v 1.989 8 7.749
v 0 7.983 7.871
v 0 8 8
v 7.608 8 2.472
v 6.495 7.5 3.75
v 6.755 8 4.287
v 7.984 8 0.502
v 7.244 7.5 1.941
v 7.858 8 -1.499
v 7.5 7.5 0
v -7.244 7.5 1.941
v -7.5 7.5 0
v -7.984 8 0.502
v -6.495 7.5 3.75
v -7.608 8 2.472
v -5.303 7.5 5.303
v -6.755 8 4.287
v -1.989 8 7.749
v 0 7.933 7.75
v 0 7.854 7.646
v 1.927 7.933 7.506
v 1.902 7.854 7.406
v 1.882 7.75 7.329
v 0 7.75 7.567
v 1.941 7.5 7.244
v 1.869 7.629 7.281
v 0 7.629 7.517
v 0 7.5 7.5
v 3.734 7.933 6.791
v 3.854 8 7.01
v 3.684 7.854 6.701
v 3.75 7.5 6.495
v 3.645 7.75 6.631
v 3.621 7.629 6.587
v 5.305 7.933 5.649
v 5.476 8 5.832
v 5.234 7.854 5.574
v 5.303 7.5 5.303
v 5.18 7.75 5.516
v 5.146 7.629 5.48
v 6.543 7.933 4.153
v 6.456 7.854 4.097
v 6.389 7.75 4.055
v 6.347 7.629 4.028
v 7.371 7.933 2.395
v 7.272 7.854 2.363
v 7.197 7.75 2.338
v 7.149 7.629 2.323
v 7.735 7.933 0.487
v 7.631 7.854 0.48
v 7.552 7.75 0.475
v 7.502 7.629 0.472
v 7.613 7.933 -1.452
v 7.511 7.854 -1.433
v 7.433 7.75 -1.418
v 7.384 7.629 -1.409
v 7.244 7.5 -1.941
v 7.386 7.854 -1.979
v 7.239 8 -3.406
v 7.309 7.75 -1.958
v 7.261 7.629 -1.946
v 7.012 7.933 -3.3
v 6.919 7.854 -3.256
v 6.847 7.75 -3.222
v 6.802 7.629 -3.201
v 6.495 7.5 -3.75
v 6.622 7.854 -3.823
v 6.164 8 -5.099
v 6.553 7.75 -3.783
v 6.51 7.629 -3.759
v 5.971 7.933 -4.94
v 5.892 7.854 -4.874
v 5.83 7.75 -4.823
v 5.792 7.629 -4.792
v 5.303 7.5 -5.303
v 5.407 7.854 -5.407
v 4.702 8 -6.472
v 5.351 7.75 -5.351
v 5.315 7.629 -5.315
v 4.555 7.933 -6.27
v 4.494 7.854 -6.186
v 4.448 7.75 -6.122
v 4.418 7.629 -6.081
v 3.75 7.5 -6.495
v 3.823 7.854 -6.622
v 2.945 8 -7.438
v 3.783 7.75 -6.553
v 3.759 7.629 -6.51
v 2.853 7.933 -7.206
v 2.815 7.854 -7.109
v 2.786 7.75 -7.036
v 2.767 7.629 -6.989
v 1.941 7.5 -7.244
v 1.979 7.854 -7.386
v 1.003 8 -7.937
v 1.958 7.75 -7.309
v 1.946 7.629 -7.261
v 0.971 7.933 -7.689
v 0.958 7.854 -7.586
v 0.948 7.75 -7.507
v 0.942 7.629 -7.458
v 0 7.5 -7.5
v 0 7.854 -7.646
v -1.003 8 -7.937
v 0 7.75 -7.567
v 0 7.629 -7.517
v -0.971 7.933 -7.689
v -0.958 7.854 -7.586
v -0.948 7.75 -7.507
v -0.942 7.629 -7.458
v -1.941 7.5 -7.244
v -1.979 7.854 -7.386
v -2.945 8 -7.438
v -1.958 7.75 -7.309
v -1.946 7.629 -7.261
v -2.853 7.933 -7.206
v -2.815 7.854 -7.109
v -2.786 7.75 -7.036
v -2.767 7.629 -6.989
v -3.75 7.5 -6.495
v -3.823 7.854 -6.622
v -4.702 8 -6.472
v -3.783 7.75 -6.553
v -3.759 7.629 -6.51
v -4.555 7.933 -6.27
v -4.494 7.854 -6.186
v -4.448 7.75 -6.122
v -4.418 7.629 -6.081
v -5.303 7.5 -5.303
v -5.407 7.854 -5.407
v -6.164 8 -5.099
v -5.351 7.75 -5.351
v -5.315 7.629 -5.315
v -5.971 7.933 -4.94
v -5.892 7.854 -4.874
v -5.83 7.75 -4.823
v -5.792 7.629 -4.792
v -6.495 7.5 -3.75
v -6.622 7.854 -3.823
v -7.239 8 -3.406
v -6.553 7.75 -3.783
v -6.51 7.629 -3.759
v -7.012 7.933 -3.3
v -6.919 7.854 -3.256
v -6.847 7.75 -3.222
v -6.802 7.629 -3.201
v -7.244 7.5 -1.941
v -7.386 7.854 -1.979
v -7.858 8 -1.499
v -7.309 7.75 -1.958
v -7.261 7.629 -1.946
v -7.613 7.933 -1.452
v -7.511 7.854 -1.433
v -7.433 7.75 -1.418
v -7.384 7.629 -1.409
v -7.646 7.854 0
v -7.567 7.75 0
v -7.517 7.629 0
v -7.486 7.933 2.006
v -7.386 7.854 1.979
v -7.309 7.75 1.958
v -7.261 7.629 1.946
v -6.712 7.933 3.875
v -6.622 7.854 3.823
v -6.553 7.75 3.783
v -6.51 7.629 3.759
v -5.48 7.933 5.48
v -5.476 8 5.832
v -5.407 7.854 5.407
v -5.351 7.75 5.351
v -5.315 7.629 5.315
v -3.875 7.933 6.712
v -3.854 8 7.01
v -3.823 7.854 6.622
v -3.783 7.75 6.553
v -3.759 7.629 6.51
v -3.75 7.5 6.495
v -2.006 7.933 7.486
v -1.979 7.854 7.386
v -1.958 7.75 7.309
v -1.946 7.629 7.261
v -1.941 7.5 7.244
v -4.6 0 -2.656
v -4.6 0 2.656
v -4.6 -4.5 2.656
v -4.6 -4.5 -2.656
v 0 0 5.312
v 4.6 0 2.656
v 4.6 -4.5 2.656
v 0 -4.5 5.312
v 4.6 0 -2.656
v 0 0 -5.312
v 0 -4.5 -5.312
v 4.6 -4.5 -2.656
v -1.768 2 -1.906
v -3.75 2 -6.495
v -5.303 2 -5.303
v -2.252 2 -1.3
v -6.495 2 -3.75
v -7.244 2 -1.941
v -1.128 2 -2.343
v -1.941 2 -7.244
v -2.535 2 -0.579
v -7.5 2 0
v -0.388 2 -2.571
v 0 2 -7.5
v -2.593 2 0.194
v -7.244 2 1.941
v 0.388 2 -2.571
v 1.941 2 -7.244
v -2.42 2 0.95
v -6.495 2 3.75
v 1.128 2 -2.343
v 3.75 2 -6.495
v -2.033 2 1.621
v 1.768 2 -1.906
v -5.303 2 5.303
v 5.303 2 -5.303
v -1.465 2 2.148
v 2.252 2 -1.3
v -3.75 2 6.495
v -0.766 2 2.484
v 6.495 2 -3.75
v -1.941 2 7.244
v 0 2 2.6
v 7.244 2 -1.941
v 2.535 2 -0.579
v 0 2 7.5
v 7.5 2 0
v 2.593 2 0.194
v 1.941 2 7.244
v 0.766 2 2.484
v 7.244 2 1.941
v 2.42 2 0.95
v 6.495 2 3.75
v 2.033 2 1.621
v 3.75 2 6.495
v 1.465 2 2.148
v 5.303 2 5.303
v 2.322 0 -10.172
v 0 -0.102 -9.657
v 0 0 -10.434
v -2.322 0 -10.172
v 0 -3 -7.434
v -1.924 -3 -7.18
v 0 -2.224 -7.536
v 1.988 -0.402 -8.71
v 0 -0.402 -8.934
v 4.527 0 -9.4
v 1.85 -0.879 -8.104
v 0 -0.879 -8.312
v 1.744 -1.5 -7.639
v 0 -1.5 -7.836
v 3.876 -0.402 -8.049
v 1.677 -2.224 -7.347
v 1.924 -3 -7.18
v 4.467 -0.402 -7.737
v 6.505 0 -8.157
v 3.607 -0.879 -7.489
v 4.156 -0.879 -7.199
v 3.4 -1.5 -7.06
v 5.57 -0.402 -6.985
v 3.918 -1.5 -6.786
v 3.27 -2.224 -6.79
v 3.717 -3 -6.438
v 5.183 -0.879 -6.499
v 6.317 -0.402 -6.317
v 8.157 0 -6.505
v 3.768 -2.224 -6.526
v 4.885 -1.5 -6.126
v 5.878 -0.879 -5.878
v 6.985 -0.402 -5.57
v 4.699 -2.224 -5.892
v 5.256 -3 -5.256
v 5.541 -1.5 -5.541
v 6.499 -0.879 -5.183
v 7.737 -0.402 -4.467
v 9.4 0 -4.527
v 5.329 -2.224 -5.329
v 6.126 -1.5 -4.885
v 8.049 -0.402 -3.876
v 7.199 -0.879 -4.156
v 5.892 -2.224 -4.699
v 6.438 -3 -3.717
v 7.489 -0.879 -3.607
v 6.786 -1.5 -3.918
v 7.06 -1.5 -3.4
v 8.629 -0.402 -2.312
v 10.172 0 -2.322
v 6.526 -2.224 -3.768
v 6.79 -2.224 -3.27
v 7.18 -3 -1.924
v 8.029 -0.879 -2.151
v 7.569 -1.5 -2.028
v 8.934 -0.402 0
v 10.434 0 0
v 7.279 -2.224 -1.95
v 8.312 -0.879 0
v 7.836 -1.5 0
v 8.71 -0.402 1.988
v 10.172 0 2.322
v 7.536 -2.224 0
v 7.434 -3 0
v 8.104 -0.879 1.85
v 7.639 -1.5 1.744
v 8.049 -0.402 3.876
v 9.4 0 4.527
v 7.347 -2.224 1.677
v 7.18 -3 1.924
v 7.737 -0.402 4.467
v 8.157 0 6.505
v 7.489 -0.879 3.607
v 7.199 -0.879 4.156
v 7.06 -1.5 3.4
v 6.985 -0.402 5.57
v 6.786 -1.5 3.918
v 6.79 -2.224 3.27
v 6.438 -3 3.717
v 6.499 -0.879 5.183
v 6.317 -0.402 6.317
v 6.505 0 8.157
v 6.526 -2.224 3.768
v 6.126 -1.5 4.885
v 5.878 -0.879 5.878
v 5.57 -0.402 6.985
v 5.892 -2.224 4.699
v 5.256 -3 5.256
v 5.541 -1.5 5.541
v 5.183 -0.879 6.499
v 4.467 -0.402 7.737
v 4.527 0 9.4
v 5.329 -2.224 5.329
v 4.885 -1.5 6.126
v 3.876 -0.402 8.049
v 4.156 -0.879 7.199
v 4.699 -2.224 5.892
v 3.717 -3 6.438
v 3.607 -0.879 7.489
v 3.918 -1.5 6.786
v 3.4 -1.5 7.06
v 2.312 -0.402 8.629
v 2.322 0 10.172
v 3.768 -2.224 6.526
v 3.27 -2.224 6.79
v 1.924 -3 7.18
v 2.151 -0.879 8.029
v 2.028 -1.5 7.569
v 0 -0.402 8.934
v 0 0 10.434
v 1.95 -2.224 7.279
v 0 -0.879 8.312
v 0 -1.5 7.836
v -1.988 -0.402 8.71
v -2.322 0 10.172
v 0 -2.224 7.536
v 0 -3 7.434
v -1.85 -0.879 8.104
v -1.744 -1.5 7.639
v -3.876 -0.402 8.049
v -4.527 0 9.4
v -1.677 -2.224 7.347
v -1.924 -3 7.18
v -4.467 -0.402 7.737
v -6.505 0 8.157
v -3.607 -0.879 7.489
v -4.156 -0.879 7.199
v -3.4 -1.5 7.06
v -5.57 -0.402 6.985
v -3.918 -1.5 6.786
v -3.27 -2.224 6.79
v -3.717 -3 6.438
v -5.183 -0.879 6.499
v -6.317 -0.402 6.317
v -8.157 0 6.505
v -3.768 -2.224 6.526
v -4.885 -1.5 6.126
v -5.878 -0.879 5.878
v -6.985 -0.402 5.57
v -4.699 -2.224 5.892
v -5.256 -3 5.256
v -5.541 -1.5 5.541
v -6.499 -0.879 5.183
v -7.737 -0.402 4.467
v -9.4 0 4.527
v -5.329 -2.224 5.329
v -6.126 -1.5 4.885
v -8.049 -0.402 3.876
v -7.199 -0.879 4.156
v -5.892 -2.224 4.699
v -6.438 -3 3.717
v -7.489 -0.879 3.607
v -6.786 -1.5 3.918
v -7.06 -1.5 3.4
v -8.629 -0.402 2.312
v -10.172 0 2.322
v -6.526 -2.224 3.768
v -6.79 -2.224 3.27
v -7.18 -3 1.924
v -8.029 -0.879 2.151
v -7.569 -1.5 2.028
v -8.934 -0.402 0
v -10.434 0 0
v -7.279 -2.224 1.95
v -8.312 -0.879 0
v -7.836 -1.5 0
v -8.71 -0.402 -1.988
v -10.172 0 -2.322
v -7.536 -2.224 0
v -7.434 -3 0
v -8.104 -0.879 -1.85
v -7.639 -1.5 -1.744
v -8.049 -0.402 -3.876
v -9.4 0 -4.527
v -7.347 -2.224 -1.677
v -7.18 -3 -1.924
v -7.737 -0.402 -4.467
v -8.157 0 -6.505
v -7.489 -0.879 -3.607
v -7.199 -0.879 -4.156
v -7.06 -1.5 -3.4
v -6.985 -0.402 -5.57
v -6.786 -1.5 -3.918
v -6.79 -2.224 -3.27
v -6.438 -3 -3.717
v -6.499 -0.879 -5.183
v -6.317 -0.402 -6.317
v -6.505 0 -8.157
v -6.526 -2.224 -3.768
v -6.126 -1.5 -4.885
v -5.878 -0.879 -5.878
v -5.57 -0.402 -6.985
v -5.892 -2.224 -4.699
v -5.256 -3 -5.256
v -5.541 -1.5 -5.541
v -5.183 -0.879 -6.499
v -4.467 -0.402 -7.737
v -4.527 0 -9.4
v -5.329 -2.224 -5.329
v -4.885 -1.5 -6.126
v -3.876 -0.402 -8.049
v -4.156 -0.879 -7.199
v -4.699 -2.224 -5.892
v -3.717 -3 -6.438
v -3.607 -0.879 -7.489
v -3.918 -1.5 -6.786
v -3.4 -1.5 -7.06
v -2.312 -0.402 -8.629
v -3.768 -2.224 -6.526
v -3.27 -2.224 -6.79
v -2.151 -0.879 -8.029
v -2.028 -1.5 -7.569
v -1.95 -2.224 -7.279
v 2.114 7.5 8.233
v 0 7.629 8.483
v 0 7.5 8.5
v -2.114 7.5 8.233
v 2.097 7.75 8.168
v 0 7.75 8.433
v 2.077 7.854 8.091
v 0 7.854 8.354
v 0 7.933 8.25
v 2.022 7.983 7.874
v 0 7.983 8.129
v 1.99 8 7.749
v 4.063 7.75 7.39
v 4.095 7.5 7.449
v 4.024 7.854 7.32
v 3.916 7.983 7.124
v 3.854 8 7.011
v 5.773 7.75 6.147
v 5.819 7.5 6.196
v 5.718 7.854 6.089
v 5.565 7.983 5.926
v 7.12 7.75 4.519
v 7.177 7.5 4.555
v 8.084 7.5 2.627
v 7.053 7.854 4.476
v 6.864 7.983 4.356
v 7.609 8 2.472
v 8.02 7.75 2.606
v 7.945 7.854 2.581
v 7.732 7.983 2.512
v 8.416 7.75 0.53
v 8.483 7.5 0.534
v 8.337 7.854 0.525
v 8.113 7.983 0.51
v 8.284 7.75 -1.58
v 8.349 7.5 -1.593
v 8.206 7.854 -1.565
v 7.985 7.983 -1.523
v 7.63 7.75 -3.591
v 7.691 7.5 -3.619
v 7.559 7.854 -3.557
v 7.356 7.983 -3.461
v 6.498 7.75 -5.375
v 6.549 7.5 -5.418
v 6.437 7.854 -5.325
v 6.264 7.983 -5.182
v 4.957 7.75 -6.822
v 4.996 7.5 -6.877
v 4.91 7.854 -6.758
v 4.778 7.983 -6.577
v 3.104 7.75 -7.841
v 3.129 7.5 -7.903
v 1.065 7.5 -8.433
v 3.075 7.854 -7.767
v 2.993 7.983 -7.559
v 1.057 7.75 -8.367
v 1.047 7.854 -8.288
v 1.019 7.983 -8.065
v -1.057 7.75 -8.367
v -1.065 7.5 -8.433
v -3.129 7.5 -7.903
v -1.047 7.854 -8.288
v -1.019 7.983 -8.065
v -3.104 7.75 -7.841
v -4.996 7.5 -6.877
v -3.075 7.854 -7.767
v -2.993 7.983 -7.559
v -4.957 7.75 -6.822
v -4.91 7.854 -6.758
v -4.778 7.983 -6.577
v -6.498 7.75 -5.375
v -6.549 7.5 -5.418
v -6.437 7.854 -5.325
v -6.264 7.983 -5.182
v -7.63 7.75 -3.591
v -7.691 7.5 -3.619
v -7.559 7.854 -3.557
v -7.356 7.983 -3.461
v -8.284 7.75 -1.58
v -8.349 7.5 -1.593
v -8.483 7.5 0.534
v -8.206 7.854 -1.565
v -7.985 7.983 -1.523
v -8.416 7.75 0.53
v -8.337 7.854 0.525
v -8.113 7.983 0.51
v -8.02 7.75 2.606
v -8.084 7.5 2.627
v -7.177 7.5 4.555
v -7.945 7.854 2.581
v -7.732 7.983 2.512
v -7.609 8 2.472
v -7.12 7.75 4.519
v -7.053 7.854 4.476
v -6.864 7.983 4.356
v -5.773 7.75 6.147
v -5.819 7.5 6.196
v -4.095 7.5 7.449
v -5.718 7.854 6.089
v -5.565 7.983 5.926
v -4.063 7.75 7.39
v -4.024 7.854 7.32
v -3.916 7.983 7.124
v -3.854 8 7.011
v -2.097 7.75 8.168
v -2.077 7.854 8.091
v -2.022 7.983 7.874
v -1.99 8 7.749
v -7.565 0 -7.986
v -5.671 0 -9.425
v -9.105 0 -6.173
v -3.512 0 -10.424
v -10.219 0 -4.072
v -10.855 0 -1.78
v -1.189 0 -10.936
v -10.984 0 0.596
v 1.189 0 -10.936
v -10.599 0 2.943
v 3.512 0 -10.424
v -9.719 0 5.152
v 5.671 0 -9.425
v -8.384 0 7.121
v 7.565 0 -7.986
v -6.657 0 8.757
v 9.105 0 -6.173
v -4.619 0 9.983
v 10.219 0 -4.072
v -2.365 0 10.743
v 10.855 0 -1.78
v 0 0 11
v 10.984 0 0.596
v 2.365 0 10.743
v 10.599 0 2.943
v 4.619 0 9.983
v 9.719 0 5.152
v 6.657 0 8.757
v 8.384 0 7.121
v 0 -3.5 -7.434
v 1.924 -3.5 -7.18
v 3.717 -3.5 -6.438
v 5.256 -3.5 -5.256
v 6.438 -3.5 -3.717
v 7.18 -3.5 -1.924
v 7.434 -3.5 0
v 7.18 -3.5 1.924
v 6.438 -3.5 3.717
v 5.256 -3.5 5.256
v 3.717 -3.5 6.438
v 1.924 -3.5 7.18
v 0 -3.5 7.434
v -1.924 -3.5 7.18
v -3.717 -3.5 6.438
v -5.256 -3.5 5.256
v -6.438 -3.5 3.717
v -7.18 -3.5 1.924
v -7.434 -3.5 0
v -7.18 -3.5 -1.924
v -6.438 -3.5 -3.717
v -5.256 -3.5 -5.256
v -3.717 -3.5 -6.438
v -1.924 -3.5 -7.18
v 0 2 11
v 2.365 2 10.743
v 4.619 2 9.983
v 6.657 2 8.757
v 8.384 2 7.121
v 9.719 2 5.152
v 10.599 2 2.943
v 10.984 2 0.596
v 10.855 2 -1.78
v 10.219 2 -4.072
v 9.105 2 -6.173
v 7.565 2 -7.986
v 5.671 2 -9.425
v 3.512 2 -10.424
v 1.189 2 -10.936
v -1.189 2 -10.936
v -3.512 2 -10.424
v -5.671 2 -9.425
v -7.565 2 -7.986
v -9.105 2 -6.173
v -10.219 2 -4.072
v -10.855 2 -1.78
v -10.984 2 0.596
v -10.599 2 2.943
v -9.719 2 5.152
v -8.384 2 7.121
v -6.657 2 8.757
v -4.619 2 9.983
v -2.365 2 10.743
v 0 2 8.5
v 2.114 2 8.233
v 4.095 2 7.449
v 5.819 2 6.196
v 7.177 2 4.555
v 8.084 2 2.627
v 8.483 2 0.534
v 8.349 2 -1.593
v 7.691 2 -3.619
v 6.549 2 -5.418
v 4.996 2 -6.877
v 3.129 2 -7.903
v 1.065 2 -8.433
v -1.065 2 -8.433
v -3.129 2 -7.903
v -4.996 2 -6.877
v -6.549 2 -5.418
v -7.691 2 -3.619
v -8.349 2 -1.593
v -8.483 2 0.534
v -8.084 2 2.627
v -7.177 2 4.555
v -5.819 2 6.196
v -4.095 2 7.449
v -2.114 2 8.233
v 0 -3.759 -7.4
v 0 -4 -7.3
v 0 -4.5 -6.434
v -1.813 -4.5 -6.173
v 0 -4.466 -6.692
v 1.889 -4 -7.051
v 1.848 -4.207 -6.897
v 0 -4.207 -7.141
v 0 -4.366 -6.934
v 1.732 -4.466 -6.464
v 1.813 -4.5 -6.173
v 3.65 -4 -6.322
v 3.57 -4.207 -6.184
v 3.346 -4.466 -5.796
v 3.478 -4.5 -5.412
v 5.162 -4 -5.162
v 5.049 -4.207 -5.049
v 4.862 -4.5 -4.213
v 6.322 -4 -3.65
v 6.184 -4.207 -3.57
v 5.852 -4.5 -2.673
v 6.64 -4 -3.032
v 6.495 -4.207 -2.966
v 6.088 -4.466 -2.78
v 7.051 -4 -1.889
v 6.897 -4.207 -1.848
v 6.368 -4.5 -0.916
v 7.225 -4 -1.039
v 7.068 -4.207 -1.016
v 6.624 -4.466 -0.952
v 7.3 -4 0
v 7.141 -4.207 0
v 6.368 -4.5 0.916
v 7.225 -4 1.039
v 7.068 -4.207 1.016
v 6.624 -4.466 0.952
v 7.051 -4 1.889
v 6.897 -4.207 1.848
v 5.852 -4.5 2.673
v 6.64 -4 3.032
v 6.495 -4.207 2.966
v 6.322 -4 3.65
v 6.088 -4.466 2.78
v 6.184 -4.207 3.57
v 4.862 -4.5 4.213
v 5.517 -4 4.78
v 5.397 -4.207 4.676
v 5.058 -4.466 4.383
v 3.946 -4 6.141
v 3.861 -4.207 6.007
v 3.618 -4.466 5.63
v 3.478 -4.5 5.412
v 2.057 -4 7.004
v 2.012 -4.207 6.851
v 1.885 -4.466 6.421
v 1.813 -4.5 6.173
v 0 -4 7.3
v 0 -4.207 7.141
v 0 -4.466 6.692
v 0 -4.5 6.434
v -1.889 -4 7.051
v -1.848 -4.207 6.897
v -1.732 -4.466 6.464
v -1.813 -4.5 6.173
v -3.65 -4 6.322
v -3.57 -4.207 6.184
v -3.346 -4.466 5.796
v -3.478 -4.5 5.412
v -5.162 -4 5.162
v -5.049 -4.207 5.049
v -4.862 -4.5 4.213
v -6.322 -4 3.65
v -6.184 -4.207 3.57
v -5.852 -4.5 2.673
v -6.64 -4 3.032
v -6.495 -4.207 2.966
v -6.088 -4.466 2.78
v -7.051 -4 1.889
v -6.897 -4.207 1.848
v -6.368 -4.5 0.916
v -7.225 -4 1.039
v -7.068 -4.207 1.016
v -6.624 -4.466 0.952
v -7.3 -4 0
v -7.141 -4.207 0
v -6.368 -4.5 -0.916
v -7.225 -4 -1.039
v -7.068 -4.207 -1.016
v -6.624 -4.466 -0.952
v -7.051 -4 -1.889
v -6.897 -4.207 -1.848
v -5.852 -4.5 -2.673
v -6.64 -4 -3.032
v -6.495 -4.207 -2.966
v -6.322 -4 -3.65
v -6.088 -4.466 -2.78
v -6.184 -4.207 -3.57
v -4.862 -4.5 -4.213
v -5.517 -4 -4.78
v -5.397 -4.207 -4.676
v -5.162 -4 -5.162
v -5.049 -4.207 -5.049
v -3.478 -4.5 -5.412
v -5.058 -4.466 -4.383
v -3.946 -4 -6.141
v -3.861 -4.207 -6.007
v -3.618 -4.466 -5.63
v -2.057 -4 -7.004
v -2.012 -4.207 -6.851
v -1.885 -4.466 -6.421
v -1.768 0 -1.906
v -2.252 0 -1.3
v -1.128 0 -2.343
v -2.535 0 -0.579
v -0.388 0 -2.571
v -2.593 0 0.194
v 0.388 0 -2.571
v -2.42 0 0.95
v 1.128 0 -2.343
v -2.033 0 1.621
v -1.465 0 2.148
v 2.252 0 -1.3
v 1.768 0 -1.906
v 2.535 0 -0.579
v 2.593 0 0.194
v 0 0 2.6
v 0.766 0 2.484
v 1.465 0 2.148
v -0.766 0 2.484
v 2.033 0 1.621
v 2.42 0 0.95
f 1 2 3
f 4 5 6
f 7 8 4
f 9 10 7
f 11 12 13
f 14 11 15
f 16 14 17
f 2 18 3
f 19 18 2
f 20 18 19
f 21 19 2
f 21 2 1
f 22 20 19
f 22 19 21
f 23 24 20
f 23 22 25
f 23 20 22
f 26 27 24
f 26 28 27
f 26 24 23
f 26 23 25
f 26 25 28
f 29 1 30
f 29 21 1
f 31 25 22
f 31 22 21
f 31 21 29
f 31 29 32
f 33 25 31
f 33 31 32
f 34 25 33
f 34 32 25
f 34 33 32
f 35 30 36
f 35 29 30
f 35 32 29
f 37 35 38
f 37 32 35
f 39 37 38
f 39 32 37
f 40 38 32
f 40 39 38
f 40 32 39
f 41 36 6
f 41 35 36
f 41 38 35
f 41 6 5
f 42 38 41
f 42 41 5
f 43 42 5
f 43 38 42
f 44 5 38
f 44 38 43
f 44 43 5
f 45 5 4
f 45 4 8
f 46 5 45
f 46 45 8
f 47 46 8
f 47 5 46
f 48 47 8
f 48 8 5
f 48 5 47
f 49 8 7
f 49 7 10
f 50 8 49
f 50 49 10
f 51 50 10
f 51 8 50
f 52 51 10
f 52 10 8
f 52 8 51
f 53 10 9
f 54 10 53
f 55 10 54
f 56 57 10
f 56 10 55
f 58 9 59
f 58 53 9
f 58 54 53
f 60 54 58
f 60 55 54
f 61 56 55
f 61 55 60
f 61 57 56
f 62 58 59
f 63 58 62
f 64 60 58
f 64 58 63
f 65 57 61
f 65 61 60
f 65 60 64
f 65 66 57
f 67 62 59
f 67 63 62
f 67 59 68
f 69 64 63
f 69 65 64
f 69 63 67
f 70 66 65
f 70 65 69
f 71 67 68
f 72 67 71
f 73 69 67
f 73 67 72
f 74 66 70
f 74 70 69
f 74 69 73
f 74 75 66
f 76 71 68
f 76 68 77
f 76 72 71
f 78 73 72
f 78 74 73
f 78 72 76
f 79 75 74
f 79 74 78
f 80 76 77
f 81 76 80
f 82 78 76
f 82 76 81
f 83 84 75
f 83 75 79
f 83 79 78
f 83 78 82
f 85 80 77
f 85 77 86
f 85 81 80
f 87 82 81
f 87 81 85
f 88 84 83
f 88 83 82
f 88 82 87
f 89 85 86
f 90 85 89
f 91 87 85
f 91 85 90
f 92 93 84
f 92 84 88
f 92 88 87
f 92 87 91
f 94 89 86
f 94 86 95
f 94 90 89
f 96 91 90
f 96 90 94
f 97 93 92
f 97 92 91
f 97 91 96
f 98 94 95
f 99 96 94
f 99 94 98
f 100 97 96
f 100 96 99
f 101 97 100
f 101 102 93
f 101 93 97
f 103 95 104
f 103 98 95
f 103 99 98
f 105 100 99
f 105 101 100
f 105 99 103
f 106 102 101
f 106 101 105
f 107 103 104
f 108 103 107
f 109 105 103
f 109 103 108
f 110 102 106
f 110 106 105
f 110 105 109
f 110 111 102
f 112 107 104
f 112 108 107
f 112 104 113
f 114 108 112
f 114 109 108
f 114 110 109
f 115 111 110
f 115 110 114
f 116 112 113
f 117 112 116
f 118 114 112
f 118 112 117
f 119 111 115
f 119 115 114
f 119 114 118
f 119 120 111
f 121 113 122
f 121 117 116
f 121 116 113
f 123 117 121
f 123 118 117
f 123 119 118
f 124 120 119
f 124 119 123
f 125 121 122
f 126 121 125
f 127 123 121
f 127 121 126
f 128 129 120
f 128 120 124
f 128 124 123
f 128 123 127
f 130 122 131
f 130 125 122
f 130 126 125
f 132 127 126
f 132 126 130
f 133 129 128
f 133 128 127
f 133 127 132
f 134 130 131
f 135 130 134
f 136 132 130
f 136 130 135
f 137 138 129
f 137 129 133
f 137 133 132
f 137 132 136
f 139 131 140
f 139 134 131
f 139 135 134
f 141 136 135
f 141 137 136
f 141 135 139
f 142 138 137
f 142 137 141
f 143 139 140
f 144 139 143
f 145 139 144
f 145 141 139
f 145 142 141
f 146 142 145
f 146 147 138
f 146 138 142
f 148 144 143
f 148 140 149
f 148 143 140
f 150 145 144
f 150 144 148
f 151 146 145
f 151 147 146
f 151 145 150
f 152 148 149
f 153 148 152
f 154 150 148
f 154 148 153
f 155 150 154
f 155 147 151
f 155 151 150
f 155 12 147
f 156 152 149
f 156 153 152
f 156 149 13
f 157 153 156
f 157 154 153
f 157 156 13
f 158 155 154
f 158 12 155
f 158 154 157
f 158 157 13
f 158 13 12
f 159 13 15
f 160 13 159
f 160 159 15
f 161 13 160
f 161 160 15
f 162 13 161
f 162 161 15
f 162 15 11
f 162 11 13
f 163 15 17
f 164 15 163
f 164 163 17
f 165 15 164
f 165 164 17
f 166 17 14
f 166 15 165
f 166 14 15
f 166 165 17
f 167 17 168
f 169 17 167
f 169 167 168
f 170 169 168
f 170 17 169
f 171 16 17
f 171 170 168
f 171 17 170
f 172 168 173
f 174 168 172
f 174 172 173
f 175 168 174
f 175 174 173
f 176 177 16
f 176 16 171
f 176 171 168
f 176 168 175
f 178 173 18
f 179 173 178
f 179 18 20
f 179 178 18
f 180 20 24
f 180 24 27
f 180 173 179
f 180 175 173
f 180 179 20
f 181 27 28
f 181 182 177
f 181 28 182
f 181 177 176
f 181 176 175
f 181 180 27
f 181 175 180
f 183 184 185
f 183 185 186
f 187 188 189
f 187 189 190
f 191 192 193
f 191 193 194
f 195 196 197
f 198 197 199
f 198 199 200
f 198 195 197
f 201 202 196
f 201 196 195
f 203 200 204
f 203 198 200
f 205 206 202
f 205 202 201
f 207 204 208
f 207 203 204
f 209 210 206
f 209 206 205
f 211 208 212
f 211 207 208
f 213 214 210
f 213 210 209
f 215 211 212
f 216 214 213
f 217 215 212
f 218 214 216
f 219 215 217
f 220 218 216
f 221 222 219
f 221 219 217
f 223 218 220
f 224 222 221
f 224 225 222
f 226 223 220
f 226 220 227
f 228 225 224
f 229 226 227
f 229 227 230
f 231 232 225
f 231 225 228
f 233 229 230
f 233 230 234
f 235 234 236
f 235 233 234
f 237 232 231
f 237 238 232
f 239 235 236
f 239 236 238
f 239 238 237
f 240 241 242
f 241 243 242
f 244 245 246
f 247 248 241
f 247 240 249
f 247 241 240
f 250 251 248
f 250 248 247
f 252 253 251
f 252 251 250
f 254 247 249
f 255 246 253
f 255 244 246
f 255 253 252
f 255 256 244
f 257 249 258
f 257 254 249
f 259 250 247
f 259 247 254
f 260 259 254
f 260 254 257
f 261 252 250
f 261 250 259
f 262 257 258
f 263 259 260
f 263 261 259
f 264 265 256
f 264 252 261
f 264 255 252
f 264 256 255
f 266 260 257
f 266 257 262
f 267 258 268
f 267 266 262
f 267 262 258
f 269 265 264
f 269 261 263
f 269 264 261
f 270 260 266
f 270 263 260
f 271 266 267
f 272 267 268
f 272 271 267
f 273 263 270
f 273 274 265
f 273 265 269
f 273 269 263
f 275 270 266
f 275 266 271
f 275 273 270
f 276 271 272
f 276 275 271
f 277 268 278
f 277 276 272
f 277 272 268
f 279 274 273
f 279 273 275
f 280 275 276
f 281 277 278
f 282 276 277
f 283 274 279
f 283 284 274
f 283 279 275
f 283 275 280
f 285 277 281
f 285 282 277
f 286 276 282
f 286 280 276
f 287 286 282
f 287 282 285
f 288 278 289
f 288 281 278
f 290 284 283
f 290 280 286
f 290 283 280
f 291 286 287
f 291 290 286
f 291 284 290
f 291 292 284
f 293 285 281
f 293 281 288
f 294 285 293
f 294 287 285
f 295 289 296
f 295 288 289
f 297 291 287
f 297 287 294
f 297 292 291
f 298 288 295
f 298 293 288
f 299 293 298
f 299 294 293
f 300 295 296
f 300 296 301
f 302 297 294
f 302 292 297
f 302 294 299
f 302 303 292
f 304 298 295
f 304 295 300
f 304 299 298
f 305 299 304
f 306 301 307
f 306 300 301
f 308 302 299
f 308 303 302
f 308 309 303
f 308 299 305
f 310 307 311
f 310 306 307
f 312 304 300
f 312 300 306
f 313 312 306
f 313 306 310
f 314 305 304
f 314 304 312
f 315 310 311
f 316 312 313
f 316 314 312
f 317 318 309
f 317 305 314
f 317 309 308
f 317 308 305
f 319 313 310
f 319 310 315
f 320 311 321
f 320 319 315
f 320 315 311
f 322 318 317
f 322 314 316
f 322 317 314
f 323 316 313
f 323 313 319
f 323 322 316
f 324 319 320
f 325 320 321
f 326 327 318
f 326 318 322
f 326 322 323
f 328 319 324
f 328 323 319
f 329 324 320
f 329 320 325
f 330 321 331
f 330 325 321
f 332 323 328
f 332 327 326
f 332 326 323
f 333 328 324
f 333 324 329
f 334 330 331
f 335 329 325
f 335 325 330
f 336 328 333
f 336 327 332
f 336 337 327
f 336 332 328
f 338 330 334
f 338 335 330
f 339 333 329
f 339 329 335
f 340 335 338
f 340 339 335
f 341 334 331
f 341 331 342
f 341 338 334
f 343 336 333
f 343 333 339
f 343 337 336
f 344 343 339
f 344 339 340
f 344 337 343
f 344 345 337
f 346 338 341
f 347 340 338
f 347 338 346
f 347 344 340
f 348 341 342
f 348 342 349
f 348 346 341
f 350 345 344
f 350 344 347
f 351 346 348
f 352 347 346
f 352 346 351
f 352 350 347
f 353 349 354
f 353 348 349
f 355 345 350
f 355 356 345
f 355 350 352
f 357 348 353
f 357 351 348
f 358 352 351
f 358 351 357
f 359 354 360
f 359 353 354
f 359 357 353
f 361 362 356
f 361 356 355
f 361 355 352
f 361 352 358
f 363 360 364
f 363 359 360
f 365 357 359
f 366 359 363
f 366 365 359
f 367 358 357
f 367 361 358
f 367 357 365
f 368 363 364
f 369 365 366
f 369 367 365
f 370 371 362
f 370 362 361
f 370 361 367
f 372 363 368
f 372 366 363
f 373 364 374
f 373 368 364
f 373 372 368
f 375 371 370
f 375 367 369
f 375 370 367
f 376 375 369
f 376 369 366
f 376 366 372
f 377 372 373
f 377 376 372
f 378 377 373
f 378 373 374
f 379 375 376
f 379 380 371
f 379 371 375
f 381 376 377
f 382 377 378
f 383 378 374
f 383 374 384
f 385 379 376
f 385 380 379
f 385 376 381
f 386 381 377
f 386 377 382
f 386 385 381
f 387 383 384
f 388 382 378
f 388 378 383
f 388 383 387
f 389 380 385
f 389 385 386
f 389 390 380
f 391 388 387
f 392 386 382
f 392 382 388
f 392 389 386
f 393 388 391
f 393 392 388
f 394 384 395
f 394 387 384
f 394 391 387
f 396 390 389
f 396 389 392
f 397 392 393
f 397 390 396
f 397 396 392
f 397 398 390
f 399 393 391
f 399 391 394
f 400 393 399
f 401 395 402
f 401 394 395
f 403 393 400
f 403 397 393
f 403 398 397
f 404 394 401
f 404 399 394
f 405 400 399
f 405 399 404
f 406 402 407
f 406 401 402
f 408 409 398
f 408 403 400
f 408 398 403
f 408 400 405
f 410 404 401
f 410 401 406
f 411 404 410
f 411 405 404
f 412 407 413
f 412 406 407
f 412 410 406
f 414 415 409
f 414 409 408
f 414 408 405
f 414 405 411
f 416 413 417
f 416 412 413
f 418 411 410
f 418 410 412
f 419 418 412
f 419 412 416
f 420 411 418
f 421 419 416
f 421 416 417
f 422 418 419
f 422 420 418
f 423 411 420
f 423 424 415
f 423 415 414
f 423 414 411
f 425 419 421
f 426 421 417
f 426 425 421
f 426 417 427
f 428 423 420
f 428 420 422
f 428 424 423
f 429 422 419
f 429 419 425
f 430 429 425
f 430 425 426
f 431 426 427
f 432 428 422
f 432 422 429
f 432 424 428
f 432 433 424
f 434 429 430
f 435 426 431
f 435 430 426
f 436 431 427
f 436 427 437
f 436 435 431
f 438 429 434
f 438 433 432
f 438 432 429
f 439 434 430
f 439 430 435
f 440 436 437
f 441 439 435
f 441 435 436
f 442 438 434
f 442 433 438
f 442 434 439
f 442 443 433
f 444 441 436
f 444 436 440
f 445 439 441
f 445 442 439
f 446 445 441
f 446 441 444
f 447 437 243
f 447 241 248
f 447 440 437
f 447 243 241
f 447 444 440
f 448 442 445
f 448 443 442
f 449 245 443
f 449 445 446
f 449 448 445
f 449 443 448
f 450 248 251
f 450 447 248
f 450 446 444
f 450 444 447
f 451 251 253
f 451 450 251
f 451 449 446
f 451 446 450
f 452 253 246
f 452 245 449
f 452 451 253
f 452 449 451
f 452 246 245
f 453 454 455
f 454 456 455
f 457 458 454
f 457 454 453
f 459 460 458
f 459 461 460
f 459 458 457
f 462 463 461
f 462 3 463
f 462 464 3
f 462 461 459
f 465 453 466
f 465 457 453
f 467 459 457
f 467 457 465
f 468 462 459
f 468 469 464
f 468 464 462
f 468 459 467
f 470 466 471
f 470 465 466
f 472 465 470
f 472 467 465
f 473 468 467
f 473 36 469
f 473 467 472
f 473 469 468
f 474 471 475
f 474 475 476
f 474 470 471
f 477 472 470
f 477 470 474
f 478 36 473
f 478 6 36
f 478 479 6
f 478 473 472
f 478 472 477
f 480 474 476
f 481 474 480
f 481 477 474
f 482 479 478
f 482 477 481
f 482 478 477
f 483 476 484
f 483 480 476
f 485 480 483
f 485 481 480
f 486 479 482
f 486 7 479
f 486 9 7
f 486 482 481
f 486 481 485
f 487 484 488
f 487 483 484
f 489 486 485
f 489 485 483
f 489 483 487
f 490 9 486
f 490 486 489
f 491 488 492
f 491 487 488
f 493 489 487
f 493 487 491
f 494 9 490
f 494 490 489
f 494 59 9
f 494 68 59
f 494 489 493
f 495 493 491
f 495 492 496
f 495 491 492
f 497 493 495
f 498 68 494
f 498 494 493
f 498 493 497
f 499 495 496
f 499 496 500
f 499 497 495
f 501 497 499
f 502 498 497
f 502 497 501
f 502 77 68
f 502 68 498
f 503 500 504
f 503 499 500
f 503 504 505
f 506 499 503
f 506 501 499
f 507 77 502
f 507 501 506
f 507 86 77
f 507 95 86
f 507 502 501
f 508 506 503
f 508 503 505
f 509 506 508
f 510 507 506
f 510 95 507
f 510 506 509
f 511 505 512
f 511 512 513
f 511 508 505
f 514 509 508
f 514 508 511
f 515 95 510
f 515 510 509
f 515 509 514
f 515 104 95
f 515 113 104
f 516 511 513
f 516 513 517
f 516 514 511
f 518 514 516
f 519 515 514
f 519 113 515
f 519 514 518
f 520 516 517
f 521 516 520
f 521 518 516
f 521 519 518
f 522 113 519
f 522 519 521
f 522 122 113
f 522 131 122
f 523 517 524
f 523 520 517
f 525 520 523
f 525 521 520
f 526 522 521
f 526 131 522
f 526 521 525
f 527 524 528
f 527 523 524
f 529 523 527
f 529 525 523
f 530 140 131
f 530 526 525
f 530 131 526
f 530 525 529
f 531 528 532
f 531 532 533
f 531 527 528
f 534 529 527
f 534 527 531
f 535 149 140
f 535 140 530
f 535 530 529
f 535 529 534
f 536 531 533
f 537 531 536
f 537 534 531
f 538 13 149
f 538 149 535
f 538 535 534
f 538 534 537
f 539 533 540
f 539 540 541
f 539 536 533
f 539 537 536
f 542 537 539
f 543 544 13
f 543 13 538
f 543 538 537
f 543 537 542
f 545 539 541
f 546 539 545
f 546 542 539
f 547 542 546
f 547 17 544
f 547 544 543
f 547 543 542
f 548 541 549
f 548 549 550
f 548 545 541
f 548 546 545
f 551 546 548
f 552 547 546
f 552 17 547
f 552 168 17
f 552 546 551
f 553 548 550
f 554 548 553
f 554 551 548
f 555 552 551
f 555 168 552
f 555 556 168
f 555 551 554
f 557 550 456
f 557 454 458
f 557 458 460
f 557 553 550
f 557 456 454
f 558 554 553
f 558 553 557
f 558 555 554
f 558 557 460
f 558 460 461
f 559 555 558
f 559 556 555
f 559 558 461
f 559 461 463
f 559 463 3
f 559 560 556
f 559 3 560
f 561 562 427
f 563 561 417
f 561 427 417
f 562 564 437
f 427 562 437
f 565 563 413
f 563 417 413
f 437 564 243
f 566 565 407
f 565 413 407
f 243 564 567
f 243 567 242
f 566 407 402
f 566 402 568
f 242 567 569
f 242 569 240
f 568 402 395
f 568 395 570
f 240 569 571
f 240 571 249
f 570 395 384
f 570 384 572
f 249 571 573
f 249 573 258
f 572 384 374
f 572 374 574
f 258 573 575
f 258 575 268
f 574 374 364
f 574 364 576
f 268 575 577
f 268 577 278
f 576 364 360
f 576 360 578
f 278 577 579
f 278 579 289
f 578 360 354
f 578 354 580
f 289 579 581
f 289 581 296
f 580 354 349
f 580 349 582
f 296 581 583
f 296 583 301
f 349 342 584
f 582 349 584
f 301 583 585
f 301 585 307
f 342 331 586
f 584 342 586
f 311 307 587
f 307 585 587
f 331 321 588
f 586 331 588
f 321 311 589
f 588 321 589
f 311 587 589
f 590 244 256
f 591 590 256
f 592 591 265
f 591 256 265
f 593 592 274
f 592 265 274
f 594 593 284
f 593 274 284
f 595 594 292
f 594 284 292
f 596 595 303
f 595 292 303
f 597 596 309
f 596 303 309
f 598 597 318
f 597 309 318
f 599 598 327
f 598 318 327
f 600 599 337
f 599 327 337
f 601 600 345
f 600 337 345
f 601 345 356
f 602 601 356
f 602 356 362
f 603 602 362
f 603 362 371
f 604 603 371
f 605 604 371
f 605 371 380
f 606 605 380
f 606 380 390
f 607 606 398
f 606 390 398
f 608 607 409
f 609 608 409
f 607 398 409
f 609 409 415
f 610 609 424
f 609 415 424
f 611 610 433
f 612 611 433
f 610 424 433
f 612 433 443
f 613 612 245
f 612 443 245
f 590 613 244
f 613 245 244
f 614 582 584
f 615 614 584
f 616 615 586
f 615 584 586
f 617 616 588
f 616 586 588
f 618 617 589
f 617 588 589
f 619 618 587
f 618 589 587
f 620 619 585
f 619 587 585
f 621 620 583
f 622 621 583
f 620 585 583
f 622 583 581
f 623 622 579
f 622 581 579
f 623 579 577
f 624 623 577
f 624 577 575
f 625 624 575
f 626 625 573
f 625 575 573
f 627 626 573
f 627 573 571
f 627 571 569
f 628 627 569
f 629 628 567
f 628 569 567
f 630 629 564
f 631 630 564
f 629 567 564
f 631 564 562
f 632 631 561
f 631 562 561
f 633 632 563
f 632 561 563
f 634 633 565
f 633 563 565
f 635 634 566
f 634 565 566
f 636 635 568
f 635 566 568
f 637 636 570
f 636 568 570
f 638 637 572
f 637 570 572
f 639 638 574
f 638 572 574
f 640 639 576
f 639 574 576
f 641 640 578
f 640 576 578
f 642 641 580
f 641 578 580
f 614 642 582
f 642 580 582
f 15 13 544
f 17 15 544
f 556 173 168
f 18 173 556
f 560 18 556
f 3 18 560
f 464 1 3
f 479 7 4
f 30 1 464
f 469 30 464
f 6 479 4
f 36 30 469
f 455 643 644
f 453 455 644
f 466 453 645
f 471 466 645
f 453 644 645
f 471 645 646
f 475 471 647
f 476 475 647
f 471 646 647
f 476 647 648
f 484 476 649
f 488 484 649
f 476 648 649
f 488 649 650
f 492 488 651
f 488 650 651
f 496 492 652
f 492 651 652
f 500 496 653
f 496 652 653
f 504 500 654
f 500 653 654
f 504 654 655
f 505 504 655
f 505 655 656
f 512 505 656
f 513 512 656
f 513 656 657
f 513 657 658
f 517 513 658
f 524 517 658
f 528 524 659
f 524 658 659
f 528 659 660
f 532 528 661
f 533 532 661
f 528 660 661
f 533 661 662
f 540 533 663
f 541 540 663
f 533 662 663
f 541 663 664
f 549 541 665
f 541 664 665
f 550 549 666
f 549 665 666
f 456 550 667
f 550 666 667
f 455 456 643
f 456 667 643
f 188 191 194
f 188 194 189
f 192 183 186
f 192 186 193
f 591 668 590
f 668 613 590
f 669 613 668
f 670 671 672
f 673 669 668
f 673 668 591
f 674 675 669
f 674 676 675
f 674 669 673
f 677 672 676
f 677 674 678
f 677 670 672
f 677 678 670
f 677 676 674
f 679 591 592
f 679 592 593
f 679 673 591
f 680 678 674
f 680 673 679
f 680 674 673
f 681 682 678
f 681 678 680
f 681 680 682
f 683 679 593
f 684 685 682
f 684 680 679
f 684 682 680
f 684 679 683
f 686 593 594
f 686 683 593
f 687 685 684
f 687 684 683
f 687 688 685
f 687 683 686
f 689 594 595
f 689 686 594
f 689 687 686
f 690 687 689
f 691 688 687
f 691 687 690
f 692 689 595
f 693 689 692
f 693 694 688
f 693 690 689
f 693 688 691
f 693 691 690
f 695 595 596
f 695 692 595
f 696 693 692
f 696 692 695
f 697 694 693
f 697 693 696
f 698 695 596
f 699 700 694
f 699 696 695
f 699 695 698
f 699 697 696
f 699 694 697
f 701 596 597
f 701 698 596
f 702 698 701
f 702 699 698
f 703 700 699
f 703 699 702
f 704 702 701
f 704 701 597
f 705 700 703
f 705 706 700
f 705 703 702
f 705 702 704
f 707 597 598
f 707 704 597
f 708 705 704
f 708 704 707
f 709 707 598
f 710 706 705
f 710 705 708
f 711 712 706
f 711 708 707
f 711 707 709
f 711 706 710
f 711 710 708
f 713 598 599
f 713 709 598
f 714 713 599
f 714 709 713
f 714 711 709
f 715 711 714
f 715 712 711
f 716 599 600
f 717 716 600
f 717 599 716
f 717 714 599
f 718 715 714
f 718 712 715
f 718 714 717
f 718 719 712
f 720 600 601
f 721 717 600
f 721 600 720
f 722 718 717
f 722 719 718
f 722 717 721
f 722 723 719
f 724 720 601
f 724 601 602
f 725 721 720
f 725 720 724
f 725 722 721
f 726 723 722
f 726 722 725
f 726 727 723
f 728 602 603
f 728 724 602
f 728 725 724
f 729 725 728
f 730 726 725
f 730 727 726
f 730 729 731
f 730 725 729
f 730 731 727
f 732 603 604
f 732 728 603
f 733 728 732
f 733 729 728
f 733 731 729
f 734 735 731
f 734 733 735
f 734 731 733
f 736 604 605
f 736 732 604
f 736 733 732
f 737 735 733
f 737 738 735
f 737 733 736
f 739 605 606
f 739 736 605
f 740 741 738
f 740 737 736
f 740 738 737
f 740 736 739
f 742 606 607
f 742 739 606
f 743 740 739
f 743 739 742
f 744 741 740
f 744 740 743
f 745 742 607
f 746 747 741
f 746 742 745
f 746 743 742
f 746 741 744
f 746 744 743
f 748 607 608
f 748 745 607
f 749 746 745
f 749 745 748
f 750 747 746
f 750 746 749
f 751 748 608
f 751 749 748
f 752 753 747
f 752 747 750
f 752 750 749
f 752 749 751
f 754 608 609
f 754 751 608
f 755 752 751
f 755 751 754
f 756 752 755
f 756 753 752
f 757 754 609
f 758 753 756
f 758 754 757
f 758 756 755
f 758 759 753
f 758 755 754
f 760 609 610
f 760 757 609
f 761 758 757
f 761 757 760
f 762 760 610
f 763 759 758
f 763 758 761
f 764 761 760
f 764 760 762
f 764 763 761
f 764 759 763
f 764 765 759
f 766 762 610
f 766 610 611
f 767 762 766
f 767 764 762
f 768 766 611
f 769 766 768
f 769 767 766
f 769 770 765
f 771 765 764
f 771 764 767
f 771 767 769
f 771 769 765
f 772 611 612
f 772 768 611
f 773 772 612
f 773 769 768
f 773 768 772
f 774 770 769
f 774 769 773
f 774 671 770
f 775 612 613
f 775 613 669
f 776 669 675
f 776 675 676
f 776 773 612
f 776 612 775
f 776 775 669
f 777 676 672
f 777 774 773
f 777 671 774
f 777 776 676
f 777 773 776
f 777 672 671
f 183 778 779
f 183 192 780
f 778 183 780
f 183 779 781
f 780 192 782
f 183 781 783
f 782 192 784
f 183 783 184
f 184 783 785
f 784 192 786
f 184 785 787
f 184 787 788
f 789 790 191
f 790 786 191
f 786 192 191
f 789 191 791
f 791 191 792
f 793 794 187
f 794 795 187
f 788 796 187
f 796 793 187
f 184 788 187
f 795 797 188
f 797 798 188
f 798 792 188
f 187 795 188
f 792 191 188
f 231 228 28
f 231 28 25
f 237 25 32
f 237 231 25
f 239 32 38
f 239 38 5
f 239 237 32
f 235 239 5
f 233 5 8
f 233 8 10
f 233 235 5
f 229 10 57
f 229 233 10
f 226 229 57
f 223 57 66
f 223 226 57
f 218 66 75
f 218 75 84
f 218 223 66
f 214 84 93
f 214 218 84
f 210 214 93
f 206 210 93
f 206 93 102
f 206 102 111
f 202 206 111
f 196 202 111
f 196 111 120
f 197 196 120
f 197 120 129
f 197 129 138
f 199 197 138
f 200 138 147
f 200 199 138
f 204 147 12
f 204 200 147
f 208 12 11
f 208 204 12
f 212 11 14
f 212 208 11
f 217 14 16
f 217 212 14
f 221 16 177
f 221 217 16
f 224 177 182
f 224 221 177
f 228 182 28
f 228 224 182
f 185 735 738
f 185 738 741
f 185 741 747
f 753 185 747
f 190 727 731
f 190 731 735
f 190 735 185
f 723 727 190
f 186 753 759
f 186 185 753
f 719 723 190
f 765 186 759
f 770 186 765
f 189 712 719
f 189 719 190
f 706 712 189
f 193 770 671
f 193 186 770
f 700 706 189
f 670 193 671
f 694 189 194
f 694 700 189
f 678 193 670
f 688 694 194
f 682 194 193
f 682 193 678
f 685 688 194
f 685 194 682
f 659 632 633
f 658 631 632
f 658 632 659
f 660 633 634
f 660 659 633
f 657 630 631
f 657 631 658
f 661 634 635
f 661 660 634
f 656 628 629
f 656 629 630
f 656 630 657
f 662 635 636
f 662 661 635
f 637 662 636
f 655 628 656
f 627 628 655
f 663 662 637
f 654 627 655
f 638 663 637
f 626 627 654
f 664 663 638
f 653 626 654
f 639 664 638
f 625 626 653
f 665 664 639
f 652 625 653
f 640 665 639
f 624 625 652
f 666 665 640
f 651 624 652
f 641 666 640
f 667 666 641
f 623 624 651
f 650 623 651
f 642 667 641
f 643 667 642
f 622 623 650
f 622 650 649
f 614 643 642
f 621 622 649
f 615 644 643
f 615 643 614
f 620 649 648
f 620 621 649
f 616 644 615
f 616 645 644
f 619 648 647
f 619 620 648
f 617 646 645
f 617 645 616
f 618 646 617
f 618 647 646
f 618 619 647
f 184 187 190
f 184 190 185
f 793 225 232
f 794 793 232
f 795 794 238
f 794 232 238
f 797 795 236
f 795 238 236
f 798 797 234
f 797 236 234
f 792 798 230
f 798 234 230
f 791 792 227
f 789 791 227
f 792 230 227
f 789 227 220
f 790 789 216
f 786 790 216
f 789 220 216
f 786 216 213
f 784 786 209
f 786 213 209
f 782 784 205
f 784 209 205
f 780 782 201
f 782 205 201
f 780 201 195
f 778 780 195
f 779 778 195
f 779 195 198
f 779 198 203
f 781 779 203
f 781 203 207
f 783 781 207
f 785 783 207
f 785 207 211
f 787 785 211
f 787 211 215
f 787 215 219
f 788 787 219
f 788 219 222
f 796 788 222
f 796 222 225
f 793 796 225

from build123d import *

# Parameters (mm, degrees)
SKETCH1_R           = 11
BOSS_EXTRUDE1_DEPTH = 2
SKETCH2_R           = 8.5
SKETCH2_R_2         = 7.5
BOSS_EXTRUDE2_DEPTH = 6
SKETCH3_R           = 2.6
CUT_EXTRUDE1_DEPTH  = 17.673332001
SKETCH4_R           = 7.43362206
BOSS_EXTRUDE3_DEPTH = 4.5
FILLET1_R           = 3
FILLET2_R           = 1
FILLET3_R           = 0.5


with BuildPart() as part:
    # Sketch1 → Boss-Extrude1 (new body)
    with BuildSketch(Plane(origin=(0, 0, 0), x_dir=(1, 0, 0), z_dir=(0, 1, 0))):
        with Locations(Location((0, 0, 0), (0, 0, 270))):
            Circle(SKETCH1_R)
    extrude(amount=BOSS_EXTRUDE1_DEPTH)

    # Sketch2 → Boss-Extrude2 (add)
    with BuildSketch(Plane(origin=(0, 2, 0), x_dir=(1, 0, 0), z_dir=(0, 1, 0))):
        with Locations(Location((0, 0, 0), (0, 0, 270))):
            Circle(SKETCH2_R)
        with Locations(Location((0, 0, 0), (0, 0, 270))):
            Circle(SKETCH2_R_2, mode=Mode.SUBTRACT)
    extrude(amount=BOSS_EXTRUDE2_DEPTH)

    # Sketch3 → Cut-Extrude1 (cut, through all)
    with BuildSketch(Plane(origin=(0, 2, 0), x_dir=(1, 0, 0), z_dir=(0, 1, 0))):
        with Locations(Location((0, 0, 0), (0, 0, 270))):
            Circle(SKETCH3_R)
    extrude(amount=-CUT_EXTRUDE1_DEPTH, mode=Mode.SUBTRACT)

    # Sketch4 → Boss-Extrude3 (add)
    with BuildSketch(Plane.XZ):
        with Locations(Location((0, 0, 0), (0, 0, 270))):
            Circle(SKETCH4_R)
        Polygon((0, -5.311622477), (4.6, -2.655811238), (4.6, 2.655811238), (0, 5.311622477), (-4.6, 2.655811238), (-4.6, -2.655811238), align=None, mode=Mode.SUBTRACT)
    extrude(amount=BOSS_EXTRUDE3_DEPTH)

    # Fillet1
    fillet1_edges = [part.edges().sort_by_distance(p)[0] for p in [
        (0, 0, 7.43362206),
    ]]
    fillet(fillet1_edges, radius=FILLET1_R)

    # Fillet2
    fillet2_edges = [part.edges().sort_by_distance(p)[0] for p in [
        (0, -4.5, 7.43362206),
    ]]
    fillet(fillet2_edges, radius=FILLET2_R)

    # Fillet3
    fillet3_edges = [part.edges().sort_by_distance(p)[0] for p in [
        (0, 8, -8.5),
        (0, 8, -7.5),
    ]]
    fillet(fillet3_edges, radius=FILLET3_R - 0.0001)  # a hair under: the kernel refuses the full size


solid = part.part
